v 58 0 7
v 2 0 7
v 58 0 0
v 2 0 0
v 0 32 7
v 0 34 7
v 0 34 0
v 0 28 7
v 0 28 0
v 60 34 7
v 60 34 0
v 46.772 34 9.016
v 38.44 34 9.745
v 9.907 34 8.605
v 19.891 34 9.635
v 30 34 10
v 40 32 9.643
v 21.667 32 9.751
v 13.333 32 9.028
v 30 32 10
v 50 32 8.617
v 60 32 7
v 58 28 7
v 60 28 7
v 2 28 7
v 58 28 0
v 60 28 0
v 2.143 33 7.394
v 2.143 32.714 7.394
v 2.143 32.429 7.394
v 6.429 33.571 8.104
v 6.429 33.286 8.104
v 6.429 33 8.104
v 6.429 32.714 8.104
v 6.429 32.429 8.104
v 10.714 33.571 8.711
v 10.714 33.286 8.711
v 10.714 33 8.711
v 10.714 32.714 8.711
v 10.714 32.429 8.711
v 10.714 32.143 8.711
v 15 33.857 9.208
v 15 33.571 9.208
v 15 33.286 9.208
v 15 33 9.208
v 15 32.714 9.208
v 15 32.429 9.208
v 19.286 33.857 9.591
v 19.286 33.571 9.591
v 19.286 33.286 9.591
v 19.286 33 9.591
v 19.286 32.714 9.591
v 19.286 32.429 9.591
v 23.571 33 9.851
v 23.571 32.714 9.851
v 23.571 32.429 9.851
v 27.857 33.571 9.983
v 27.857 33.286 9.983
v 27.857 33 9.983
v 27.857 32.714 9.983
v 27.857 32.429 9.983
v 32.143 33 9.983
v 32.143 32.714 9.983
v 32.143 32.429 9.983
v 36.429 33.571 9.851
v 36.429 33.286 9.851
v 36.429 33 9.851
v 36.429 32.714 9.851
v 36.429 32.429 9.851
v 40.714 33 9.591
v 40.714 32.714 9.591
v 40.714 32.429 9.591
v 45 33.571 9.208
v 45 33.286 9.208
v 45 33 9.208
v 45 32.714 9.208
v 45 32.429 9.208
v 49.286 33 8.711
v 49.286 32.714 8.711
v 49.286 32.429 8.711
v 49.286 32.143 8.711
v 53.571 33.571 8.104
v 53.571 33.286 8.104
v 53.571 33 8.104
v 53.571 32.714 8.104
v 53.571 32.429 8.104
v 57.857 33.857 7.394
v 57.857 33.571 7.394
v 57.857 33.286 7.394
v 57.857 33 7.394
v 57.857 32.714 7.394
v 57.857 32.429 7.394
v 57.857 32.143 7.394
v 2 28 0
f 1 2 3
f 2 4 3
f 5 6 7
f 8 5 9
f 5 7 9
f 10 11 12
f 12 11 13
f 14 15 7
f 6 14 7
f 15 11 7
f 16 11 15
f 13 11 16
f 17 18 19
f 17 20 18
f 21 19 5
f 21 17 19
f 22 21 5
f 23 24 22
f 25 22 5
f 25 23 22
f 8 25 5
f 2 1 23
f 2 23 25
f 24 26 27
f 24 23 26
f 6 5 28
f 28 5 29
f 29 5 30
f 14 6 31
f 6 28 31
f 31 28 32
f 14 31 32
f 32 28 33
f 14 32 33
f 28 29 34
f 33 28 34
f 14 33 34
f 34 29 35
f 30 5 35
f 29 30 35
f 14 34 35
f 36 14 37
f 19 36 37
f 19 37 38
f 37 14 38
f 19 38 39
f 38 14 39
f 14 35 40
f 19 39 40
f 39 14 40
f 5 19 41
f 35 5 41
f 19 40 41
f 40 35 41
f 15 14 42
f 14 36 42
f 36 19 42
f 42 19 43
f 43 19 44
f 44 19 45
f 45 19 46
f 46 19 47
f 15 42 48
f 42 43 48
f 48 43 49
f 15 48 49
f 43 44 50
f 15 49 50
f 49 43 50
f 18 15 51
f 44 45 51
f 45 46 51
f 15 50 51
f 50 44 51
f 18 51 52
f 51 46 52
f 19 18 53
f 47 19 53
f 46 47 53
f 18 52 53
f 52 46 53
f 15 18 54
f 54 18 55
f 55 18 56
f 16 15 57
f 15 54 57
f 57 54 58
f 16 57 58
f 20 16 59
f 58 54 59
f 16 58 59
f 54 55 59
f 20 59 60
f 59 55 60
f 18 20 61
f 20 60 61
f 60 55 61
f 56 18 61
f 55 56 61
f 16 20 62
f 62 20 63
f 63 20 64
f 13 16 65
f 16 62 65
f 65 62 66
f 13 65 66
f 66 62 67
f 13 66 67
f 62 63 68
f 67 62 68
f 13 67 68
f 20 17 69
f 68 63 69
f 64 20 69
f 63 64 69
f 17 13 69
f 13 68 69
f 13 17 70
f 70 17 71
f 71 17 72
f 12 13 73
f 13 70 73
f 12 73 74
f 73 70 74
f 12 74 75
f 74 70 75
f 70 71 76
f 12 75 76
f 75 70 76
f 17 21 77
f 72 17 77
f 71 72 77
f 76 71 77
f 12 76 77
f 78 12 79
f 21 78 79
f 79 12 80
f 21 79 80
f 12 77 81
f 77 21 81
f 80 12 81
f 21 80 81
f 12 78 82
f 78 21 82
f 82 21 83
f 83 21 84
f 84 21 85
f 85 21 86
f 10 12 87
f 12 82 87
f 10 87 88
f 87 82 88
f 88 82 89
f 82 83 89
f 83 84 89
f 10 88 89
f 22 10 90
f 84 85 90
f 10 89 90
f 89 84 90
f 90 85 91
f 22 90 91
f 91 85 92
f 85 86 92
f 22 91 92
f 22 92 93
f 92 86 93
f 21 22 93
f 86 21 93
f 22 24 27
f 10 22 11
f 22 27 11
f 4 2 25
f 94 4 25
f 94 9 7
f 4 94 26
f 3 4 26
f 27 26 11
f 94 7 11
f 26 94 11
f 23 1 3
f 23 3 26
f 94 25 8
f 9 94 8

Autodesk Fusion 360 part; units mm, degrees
sketch "スケッチ1" plane through (0, 0, 0) normal (0, 0, 1) x (1, 0, 0)
  line L0 (0, 0) -> (60, 0)
  line L1 (60, 0) -> (60, 34)
  line L2 (60, 34) -> (0, 34)
  line L3 (0, 34) -> (0, 0)
  dimension "d1" = 60
  dimension "d2" = 34
extrude "押し出し1" add sketch "スケッチ1" along normal blind 10
sketch "スケッチ2" plane through (0, 0, 10) normal (0, 0, 1) x (-1, 0, 0)
  line L0 (0, -34) -> (0, 0)
  line L1 (0, 0) -> (-60, 0)
  line L2 (-60, 0) -> (-60, -34)
  line L3 (-60, -34) -> (0, -34)
  line L4 (-60, 0) -> (-58, 0)
  line L5 (-58, 0) -> (-58, -28)
  line L6 (-58, -28) -> (-60, -28)
  line L7 (-60, -28) -> (-60, 0)
  dimension "d5" = 2
  dimension "d6" = 28
extrude "押し出し2" cut sketch "スケッチ2" against normal blind 10 contours L1 L2 L4 L5 L6 L7
sketch "スケッチ3" plane through (0, 0, 10) normal (0, 0, 1) x (-1, 0, 0)
  line L0 (-58, 0) -> (-58, -28)
  line L1 (-58, -28) -> (-60, -28)
  line L2 (-60, -28) -> (-60, -34)
  line L3 (-60, -34) -> (0, -34)
  line L4 (0, -34) -> (0, 0)
  line L5 (0, 0) -> (-58, 0)
  line L6 (0, 0) -> (-2, 0)
  line L7 (-2, 0) -> (-2, -28)
  line L8 (-2, -28) -> (0, -28)
  line L9 (0, -28) -> (0, 0)
  dimension "d9" = 2
  dimension "d10" = 28
extrude "押し出し3" cut sketch "スケッチ3" against normal blind 15 contours L4 L5 L6 L7 L8 L9
sketch "スケッチ4" plane through (0, 0, 0) normal (0, 1, 0) x (1, 0, 0)
sketch "スケッチ5" plane through (0, 0, 0) normal (0, -1, 0) x (1, 0, 0)
  line L0 (2, 10) -> (2, 0)
  line L1 (2, 0) -> (58, 0)
  line L2 (58, 0) -> (58, 10)
  line L3 (58, 10) -> (2, 10)
  line L4 (58, 10) -> (2, 10)
  line L5 (2, 10) -> (2, 7)
  line L6 (2, 7) -> (58, 7)
  line L7 (58, 7) -> (58, 10)
  dimension "d13" = 3
extrude "押し出し4" cut sketch "スケッチ5" against normal blind 32 contours L0 L2 L3 L4 L5 L6 L7
sketch "スケッチ6" plane through (0, 0, 10) normal (0, 0, 1) x (-1, 0, 0)
  line L0 (-2, -28) -> (-2, -32)
  line L1 (-2, -32) -> (-58, -32)
  line L2 (-58, -32) -> (-58, -28)
  line L3 (-58, -28) -> (-60, -28)
  line L4 (-60, -28) -> (-60, -34)
  line L5 (-60, -34) -> (0, -34)
  line L6 (0, -34) -> (0, -28)
  line L7 (0, -28) -> (-2, -28)
  line L8 (-2, -28) -> (0, -28)
  line L9 (0, -28) -> (0, -32)
  line L10 (0, -32) -> (-2, -32)
  line L11 (-2, -32) -> (-2, -28)
extrude "押し出し5" cut sketch "スケッチ6" against normal blind 3 contours L0 L6 L7 L8 L9 L10 L11
sketch "スケッチ7" plane through (0, 0, 10) normal (0, 0, 1) x (-1, 0, 0)
  line L0 (0, -32) -> (-58, -32)
  line L1 (-58, -32) -> (-58, -28)
  line L2 (-58, -28) -> (-60, -28)
  line L3 (-60, -28) -> (-60, -34)
  line L4 (-60, -34) -> (0, -34)
  line L5 (0, -34) -> (0, -32)
  line L6 (-58, -32) -> (-60, -32)
  line L7 (-60, -32) -> (-60, -28)
  line L8 (-60, -28) -> (-58, -28)
  line L9 (-58, -28) -> (-58, -32)
extrude "押し出し6" cut sketch "スケッチ7" against normal blind 3 contours L1 L2 L3 L6 L7 L8 L9
sketch "スケッチ8" plane through (0, 0, 10) normal (0, 0, 1) x (-1, 0, 0)
  line L0 (-60, -32) -> (-60, -34)
  line L1 (-60, -34) -> (0, -34)
  line L2 (0, -34) -> (0, -32)
sketch "スケッチ9" plane through (0, 0, 10) normal (0, 0, 1) x (1, 0, 0)
sketch "スケッチ10" plane through (0, 32, 0) normal (0, -1, 0) x (1, 0, 0)
  line L0 (60, 10) -> (0, 10)
  line L1 (0, 10) -> (0, 7)
  line L2 (0, 7) -> (60, 7)
  line L3 (60, 7) -> (60, 10)
  spline S0 degree 5 poles (0, 7) (1.2, 7.2275) (3.6, 7.6628) (7.2, 8.256) (12, 8.9257) (18, 9.5472) (24, 9.9337) (30, 10.066) (36, 9.9337) (42, 9.5472) (48, 8.9257) (52.8, 8.256) (56.4, 7.6628) (58.8, 7.2275) (60, 7) knots 0 0 0 0 0 0 0.1 0.2 0.3 0.4 0.5 0.6 0.7 0.8 0.9 1 1 1 1 1 1
  point P0 (30, 10)
extrude "押し出し7" cut sketch "スケッチ10" against normal blind 16 contours L0 L3 S0 | L0 L1 S0
sketch "スケッチ11" plane through (0, 0, 0) normal (0, 0, -1) x (1, 0, 0)
  line L0 (2, -28) -> (0, -28)
  line L1 (0, -28) -> (0, -34)
  line L2 (0, -34) -> (60, -34)
  line L3 (60, -34) -> (60, -28)
  line L4 (60, -28) -> (58, -28)
  line L5 (58, -28) -> (58, 0)
  line L6 (58, 0) -> (2, 0)
  line L7 (2, 0) -> (2, -28)
